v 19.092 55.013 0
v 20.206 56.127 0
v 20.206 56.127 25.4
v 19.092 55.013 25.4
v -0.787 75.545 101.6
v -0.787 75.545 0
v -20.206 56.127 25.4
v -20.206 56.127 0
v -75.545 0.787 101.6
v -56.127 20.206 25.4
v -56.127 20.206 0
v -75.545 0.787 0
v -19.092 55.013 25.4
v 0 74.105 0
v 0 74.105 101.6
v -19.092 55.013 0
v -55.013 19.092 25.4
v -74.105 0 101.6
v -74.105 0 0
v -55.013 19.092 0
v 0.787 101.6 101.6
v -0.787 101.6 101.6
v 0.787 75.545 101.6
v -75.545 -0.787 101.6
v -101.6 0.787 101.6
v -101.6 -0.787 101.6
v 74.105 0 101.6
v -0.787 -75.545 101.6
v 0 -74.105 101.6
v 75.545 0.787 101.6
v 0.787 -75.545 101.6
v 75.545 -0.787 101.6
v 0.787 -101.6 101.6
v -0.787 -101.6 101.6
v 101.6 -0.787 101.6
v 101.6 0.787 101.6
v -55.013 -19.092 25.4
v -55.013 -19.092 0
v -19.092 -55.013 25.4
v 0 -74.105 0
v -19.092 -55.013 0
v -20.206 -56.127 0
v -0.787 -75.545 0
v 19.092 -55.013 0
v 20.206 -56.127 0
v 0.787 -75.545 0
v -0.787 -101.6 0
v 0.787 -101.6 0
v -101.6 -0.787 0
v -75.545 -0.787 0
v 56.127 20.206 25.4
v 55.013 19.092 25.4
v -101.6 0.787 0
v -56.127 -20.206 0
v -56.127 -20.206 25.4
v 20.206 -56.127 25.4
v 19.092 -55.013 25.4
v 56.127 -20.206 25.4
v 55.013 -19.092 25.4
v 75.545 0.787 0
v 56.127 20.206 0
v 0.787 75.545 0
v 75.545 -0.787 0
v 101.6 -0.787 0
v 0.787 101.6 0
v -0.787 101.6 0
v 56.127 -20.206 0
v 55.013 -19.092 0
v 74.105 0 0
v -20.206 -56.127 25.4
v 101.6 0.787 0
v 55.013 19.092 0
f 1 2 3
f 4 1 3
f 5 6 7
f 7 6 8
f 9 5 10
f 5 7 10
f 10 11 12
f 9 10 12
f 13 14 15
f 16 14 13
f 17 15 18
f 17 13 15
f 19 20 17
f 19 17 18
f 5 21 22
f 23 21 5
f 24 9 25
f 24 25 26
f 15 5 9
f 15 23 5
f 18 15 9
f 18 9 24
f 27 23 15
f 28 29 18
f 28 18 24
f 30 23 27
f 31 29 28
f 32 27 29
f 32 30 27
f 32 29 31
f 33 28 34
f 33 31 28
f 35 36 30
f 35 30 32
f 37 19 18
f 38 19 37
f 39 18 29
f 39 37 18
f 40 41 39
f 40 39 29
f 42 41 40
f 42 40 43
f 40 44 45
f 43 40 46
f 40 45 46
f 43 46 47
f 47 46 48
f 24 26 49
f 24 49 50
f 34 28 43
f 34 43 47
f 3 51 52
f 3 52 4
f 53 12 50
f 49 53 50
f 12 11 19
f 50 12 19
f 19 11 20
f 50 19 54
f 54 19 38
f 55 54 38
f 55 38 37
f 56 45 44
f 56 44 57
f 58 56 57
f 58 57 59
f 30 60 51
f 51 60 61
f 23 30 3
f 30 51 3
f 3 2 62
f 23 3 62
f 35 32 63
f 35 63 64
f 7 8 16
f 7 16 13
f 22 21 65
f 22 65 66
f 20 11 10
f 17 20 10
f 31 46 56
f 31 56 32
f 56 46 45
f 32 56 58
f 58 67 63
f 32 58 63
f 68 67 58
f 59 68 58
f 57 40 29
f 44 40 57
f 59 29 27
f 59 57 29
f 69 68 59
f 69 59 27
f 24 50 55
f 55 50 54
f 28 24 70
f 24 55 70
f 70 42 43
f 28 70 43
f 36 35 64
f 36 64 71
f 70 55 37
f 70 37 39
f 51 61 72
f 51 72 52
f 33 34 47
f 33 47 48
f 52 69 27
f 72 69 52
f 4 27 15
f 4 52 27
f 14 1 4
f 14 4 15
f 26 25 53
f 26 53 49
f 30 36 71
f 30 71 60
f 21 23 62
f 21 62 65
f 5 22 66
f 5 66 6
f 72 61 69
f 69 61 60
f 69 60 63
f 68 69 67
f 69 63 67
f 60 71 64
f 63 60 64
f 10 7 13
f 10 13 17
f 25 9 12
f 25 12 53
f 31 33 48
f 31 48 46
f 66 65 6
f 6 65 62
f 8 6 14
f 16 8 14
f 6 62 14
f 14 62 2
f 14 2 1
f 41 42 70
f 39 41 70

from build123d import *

# Parameters (mm, degrees)
F1_DEPTH        = 101.6
F2_T            = -1.5748
F4_DEPTH        = 101.6
F4_COPIES_COUNT = 4
F6_W            = 50.8
F6_H            = 25.4
F7_DEPTH        = 1.5748
F7_COPIES_COUNT = 4


# Not quite as in the source:
# - a pattern or mirror of a feature is missing from the dataset's text; its kind, count and spacing are read off the source's solid


with BuildPart() as f1:
    # F0 (on Top) → F1 (new body)
    with BuildSketch(Plane.XY):
        Polygon((76.3321770291, 0), (0, 76.3321770291), (-76.3321770291, 0), (0, -76.3321770291), align=None)
    extrude(amount=F1_DEPTH)

    # F2
    f2_openings = [f1.faces().sort_by_distance(p)[0] for p in [
        (0, 0, 101.6),
        (0, 0, 0),
    ]]
    offset(amount=F2_T, openings=f2_openings)

    # F3 (on face) → F4 (join, through all)
    with BuildSketch(Plane.XY.offset(101.6)):
        Polygon((-101.6, -0.7874), (-75.5447770291, -0.7874), (-76.3321770291, 0), (-75.5447770291, 0.7874), (-101.6, 0.7874), align=None)
        Polygon((-75.5447770291, -0.7874), (-73.3176735111, -0.7874), (-74.1050735111, 0), (-73.3176735111, 0.7874), (-75.5447770291, 0.7874), (-76.3321770291, 0), align=None)
    f4 = extrude(amount=-F4_DEPTH)

    # F4_copies: F4 ×4 about axis
    f4_copies_axis = Axis((0, 0, 0), (0, 0, 1))
    for i in range(1, F4_COPIES_COUNT):
        add(f4.rotate(f4_copies_axis, i * 360 / F4_COPIES_COUNT))

    # F6 (on face) → F7 (cut, through all)
    with BuildSketch(Plane(origin=(38.1660885145, -38.1660885145, 0), x_dir=(0.7071067812, 0.7071067812, 0), z_dir=(0.7071067812, -0.7071067812, 0))):
        with Locations((0, 12.7)):
            Rectangle(F6_W, F6_H)
    f7 = extrude(amount=-F7_DEPTH, mode=Mode.SUBTRACT)

    # F7_copies: F7 ×4 about axis
    f7_copies_axis = Axis((0, 0, 0), (0, 0, 1))
    for i in range(1, F7_COPIES_COUNT):
        add(f7.rotate(f7_copies_axis, i * 360 / F7_COPIES_COUNT), mode=Mode.SUBTRACT)


solid = f1.part
